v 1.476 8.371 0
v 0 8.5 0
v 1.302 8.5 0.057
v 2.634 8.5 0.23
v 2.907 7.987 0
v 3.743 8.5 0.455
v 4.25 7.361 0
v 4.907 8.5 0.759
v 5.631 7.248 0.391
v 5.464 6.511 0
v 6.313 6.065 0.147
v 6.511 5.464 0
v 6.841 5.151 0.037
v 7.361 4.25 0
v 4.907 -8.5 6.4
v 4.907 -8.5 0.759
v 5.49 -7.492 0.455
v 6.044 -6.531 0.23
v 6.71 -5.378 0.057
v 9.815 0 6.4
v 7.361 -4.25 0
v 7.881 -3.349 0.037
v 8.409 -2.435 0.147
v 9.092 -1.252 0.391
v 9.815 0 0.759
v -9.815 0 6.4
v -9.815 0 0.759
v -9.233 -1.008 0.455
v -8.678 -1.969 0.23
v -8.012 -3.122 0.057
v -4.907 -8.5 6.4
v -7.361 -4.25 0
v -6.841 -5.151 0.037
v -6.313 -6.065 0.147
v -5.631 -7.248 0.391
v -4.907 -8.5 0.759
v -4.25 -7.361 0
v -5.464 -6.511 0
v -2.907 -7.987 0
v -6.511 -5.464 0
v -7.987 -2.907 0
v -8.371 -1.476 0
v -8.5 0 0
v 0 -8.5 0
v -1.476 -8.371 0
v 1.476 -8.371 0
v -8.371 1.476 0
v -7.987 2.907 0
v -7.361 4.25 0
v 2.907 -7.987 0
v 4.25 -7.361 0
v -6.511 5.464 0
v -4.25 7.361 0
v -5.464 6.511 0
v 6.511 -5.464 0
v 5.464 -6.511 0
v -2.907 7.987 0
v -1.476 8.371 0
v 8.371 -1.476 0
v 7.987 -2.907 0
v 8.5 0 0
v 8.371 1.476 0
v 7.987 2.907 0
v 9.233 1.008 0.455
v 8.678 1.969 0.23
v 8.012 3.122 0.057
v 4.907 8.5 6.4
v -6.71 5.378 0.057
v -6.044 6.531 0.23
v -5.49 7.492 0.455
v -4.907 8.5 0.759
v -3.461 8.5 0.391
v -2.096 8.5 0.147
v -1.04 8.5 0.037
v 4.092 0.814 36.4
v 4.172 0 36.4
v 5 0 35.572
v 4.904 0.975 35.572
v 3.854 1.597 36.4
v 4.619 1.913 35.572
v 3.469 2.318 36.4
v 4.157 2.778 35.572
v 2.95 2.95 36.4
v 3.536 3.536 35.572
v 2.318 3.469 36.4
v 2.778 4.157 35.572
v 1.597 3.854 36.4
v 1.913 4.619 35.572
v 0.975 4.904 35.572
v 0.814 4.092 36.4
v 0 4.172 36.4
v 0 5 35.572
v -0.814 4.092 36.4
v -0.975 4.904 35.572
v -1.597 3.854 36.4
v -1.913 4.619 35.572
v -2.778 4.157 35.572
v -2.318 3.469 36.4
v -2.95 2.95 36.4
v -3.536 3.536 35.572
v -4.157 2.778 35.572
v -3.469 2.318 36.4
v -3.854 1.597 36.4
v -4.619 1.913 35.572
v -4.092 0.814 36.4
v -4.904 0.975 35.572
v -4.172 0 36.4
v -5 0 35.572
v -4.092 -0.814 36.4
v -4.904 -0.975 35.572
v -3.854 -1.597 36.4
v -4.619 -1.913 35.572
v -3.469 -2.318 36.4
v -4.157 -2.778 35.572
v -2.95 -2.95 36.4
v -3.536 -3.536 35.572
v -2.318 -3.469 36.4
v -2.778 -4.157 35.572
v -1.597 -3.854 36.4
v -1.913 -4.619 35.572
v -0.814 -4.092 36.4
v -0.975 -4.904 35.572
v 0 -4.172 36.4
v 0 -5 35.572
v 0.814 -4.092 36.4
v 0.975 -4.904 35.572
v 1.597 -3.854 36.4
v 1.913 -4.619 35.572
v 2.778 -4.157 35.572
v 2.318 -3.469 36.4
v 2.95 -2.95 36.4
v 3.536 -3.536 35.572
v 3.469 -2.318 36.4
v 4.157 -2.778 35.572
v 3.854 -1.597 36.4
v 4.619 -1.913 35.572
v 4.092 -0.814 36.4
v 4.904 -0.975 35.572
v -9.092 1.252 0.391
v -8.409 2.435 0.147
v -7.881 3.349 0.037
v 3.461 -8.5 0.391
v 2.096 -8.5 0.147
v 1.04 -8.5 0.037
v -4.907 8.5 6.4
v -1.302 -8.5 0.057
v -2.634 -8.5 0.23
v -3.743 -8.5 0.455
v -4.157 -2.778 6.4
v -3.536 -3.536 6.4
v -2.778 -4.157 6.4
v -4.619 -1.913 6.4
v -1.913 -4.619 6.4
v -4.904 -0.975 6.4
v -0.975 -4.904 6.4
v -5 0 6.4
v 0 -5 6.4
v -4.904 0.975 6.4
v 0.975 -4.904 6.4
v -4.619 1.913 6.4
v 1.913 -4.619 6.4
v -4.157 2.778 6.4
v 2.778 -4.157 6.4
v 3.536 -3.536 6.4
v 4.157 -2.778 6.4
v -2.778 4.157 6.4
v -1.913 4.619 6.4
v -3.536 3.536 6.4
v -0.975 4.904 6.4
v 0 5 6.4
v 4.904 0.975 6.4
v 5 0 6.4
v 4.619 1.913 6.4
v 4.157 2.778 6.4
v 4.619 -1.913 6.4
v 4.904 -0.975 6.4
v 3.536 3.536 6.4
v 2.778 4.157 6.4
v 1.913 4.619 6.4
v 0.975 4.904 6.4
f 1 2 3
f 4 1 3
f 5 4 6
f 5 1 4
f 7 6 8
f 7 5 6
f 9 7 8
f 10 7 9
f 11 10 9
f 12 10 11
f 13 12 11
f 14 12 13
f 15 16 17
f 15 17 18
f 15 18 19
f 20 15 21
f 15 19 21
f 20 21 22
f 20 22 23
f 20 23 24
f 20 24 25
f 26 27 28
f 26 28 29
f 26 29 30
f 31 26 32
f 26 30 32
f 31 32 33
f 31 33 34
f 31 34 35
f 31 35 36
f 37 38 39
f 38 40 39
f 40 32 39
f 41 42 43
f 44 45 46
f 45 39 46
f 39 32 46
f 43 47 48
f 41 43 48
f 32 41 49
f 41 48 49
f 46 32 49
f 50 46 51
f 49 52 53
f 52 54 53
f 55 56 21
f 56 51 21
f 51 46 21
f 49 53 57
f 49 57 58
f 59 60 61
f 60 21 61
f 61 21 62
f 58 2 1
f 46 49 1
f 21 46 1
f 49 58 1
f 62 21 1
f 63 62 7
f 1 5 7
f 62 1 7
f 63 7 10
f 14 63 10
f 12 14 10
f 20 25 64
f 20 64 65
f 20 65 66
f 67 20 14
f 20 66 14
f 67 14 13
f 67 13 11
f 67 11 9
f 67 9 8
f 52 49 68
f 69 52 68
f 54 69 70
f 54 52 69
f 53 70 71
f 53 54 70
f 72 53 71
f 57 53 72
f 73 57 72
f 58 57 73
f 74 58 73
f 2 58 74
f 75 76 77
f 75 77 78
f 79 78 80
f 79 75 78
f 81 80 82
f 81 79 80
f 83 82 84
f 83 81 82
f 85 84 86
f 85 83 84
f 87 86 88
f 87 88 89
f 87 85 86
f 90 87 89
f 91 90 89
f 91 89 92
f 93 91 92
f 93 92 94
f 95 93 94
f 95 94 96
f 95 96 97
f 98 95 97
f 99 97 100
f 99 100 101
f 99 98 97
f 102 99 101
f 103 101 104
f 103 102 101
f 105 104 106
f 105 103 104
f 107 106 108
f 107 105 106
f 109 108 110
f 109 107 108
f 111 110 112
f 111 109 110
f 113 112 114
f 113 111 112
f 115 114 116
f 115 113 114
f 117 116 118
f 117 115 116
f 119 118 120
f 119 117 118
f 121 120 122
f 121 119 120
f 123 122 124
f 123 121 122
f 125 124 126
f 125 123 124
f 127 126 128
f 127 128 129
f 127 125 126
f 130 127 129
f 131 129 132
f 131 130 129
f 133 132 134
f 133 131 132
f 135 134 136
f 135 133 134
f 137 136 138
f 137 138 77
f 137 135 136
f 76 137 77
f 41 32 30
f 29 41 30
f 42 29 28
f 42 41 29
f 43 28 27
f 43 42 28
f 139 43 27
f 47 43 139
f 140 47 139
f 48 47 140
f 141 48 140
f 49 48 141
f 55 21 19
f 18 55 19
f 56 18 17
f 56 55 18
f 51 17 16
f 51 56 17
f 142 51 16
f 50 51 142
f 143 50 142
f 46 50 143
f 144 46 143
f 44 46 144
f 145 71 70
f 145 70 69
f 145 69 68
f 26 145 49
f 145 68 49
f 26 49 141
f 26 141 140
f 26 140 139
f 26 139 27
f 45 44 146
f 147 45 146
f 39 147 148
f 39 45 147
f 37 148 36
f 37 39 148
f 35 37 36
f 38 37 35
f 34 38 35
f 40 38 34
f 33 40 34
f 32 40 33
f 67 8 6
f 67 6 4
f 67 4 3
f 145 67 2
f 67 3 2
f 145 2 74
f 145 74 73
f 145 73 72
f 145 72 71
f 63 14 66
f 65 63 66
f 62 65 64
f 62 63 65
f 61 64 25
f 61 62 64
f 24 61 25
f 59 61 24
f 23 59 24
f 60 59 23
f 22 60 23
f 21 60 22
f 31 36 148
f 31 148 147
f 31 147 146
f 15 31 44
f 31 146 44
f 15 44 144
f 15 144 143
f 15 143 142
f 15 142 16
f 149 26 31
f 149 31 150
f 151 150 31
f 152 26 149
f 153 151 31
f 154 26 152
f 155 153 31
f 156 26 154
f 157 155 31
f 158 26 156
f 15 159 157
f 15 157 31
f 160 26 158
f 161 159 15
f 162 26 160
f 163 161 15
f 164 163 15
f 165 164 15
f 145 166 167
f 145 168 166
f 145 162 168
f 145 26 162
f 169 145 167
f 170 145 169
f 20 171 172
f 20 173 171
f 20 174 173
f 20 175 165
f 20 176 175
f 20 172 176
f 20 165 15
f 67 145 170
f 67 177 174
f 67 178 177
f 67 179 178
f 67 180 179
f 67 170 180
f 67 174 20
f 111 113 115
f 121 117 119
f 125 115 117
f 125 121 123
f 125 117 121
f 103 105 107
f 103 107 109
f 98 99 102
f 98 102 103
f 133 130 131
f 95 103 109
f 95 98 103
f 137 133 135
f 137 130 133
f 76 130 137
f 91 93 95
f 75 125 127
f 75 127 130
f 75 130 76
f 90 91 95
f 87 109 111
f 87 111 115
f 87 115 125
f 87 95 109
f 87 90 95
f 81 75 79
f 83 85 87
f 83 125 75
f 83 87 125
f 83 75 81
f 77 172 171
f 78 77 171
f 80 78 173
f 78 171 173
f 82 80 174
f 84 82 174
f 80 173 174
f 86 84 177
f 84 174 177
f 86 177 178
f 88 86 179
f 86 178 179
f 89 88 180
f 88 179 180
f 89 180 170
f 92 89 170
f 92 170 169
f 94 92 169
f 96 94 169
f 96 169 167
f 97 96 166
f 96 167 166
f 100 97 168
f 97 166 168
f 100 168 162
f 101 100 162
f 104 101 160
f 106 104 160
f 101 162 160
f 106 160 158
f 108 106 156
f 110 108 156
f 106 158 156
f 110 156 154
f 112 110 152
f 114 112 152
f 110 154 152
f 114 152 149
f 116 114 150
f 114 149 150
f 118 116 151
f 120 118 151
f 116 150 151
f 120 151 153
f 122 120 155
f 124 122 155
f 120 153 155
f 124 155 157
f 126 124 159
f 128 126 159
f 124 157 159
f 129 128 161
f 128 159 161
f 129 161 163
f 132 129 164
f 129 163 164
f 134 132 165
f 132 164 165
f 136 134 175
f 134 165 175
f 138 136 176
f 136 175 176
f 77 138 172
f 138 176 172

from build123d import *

# Parameters (mm, degrees)
EXTRUDE_1_DEPTH = 6.4
SKETCH_2_R      = 5
EXTRUDE_2_DEPTH = 30
CHAMFER_1_SIZE  = 0.828


with BuildPart() as part:
    # Эскиз1 → Бобышка-Вытянуть1 (new body)
    with BuildSketch(Plane.XY):
        Polygon((-4.907477288, 8.5), (-9.814954576, 0), (-4.907477288, -8.5), (4.907477288, -8.5), (9.814954576, 0), (4.907477288, 8.5), align=None)
    extrude(amount=EXTRUDE_1_DEPTH)

    # Эскиз2 → Бобышка-Вытянуть2 (add)
    with BuildSketch(Plane.XY.offset(6.4)):
        Circle(SKETCH_2_R)
    extrude(amount=EXTRUDE_2_DEPTH)

    # Эскиз3 → Вырез-Повернуть1 (revolve, cut)
    with BuildSketch(Plane(origin=(0, 0, 0), x_dir=(0, 0, -1), z_dir=(1, 0, 0))):
        Polygon((0, 8.5), (0, 11.5), (-1.732050808, 11.5), align=None)
    revolve(axis=Axis((0, 0, 1000), (0, 0, -1)), mode=Mode.SUBTRACT)

    # Фаска1
    chamfer_1_edges = [part.edges().sort_by_distance(p)[0] for p in [
        (-5, 0, 36.4),
    ]]
    chamfer(chamfer_1_edges, length=CHAMFER_1_SIZE)


solid = part.part
